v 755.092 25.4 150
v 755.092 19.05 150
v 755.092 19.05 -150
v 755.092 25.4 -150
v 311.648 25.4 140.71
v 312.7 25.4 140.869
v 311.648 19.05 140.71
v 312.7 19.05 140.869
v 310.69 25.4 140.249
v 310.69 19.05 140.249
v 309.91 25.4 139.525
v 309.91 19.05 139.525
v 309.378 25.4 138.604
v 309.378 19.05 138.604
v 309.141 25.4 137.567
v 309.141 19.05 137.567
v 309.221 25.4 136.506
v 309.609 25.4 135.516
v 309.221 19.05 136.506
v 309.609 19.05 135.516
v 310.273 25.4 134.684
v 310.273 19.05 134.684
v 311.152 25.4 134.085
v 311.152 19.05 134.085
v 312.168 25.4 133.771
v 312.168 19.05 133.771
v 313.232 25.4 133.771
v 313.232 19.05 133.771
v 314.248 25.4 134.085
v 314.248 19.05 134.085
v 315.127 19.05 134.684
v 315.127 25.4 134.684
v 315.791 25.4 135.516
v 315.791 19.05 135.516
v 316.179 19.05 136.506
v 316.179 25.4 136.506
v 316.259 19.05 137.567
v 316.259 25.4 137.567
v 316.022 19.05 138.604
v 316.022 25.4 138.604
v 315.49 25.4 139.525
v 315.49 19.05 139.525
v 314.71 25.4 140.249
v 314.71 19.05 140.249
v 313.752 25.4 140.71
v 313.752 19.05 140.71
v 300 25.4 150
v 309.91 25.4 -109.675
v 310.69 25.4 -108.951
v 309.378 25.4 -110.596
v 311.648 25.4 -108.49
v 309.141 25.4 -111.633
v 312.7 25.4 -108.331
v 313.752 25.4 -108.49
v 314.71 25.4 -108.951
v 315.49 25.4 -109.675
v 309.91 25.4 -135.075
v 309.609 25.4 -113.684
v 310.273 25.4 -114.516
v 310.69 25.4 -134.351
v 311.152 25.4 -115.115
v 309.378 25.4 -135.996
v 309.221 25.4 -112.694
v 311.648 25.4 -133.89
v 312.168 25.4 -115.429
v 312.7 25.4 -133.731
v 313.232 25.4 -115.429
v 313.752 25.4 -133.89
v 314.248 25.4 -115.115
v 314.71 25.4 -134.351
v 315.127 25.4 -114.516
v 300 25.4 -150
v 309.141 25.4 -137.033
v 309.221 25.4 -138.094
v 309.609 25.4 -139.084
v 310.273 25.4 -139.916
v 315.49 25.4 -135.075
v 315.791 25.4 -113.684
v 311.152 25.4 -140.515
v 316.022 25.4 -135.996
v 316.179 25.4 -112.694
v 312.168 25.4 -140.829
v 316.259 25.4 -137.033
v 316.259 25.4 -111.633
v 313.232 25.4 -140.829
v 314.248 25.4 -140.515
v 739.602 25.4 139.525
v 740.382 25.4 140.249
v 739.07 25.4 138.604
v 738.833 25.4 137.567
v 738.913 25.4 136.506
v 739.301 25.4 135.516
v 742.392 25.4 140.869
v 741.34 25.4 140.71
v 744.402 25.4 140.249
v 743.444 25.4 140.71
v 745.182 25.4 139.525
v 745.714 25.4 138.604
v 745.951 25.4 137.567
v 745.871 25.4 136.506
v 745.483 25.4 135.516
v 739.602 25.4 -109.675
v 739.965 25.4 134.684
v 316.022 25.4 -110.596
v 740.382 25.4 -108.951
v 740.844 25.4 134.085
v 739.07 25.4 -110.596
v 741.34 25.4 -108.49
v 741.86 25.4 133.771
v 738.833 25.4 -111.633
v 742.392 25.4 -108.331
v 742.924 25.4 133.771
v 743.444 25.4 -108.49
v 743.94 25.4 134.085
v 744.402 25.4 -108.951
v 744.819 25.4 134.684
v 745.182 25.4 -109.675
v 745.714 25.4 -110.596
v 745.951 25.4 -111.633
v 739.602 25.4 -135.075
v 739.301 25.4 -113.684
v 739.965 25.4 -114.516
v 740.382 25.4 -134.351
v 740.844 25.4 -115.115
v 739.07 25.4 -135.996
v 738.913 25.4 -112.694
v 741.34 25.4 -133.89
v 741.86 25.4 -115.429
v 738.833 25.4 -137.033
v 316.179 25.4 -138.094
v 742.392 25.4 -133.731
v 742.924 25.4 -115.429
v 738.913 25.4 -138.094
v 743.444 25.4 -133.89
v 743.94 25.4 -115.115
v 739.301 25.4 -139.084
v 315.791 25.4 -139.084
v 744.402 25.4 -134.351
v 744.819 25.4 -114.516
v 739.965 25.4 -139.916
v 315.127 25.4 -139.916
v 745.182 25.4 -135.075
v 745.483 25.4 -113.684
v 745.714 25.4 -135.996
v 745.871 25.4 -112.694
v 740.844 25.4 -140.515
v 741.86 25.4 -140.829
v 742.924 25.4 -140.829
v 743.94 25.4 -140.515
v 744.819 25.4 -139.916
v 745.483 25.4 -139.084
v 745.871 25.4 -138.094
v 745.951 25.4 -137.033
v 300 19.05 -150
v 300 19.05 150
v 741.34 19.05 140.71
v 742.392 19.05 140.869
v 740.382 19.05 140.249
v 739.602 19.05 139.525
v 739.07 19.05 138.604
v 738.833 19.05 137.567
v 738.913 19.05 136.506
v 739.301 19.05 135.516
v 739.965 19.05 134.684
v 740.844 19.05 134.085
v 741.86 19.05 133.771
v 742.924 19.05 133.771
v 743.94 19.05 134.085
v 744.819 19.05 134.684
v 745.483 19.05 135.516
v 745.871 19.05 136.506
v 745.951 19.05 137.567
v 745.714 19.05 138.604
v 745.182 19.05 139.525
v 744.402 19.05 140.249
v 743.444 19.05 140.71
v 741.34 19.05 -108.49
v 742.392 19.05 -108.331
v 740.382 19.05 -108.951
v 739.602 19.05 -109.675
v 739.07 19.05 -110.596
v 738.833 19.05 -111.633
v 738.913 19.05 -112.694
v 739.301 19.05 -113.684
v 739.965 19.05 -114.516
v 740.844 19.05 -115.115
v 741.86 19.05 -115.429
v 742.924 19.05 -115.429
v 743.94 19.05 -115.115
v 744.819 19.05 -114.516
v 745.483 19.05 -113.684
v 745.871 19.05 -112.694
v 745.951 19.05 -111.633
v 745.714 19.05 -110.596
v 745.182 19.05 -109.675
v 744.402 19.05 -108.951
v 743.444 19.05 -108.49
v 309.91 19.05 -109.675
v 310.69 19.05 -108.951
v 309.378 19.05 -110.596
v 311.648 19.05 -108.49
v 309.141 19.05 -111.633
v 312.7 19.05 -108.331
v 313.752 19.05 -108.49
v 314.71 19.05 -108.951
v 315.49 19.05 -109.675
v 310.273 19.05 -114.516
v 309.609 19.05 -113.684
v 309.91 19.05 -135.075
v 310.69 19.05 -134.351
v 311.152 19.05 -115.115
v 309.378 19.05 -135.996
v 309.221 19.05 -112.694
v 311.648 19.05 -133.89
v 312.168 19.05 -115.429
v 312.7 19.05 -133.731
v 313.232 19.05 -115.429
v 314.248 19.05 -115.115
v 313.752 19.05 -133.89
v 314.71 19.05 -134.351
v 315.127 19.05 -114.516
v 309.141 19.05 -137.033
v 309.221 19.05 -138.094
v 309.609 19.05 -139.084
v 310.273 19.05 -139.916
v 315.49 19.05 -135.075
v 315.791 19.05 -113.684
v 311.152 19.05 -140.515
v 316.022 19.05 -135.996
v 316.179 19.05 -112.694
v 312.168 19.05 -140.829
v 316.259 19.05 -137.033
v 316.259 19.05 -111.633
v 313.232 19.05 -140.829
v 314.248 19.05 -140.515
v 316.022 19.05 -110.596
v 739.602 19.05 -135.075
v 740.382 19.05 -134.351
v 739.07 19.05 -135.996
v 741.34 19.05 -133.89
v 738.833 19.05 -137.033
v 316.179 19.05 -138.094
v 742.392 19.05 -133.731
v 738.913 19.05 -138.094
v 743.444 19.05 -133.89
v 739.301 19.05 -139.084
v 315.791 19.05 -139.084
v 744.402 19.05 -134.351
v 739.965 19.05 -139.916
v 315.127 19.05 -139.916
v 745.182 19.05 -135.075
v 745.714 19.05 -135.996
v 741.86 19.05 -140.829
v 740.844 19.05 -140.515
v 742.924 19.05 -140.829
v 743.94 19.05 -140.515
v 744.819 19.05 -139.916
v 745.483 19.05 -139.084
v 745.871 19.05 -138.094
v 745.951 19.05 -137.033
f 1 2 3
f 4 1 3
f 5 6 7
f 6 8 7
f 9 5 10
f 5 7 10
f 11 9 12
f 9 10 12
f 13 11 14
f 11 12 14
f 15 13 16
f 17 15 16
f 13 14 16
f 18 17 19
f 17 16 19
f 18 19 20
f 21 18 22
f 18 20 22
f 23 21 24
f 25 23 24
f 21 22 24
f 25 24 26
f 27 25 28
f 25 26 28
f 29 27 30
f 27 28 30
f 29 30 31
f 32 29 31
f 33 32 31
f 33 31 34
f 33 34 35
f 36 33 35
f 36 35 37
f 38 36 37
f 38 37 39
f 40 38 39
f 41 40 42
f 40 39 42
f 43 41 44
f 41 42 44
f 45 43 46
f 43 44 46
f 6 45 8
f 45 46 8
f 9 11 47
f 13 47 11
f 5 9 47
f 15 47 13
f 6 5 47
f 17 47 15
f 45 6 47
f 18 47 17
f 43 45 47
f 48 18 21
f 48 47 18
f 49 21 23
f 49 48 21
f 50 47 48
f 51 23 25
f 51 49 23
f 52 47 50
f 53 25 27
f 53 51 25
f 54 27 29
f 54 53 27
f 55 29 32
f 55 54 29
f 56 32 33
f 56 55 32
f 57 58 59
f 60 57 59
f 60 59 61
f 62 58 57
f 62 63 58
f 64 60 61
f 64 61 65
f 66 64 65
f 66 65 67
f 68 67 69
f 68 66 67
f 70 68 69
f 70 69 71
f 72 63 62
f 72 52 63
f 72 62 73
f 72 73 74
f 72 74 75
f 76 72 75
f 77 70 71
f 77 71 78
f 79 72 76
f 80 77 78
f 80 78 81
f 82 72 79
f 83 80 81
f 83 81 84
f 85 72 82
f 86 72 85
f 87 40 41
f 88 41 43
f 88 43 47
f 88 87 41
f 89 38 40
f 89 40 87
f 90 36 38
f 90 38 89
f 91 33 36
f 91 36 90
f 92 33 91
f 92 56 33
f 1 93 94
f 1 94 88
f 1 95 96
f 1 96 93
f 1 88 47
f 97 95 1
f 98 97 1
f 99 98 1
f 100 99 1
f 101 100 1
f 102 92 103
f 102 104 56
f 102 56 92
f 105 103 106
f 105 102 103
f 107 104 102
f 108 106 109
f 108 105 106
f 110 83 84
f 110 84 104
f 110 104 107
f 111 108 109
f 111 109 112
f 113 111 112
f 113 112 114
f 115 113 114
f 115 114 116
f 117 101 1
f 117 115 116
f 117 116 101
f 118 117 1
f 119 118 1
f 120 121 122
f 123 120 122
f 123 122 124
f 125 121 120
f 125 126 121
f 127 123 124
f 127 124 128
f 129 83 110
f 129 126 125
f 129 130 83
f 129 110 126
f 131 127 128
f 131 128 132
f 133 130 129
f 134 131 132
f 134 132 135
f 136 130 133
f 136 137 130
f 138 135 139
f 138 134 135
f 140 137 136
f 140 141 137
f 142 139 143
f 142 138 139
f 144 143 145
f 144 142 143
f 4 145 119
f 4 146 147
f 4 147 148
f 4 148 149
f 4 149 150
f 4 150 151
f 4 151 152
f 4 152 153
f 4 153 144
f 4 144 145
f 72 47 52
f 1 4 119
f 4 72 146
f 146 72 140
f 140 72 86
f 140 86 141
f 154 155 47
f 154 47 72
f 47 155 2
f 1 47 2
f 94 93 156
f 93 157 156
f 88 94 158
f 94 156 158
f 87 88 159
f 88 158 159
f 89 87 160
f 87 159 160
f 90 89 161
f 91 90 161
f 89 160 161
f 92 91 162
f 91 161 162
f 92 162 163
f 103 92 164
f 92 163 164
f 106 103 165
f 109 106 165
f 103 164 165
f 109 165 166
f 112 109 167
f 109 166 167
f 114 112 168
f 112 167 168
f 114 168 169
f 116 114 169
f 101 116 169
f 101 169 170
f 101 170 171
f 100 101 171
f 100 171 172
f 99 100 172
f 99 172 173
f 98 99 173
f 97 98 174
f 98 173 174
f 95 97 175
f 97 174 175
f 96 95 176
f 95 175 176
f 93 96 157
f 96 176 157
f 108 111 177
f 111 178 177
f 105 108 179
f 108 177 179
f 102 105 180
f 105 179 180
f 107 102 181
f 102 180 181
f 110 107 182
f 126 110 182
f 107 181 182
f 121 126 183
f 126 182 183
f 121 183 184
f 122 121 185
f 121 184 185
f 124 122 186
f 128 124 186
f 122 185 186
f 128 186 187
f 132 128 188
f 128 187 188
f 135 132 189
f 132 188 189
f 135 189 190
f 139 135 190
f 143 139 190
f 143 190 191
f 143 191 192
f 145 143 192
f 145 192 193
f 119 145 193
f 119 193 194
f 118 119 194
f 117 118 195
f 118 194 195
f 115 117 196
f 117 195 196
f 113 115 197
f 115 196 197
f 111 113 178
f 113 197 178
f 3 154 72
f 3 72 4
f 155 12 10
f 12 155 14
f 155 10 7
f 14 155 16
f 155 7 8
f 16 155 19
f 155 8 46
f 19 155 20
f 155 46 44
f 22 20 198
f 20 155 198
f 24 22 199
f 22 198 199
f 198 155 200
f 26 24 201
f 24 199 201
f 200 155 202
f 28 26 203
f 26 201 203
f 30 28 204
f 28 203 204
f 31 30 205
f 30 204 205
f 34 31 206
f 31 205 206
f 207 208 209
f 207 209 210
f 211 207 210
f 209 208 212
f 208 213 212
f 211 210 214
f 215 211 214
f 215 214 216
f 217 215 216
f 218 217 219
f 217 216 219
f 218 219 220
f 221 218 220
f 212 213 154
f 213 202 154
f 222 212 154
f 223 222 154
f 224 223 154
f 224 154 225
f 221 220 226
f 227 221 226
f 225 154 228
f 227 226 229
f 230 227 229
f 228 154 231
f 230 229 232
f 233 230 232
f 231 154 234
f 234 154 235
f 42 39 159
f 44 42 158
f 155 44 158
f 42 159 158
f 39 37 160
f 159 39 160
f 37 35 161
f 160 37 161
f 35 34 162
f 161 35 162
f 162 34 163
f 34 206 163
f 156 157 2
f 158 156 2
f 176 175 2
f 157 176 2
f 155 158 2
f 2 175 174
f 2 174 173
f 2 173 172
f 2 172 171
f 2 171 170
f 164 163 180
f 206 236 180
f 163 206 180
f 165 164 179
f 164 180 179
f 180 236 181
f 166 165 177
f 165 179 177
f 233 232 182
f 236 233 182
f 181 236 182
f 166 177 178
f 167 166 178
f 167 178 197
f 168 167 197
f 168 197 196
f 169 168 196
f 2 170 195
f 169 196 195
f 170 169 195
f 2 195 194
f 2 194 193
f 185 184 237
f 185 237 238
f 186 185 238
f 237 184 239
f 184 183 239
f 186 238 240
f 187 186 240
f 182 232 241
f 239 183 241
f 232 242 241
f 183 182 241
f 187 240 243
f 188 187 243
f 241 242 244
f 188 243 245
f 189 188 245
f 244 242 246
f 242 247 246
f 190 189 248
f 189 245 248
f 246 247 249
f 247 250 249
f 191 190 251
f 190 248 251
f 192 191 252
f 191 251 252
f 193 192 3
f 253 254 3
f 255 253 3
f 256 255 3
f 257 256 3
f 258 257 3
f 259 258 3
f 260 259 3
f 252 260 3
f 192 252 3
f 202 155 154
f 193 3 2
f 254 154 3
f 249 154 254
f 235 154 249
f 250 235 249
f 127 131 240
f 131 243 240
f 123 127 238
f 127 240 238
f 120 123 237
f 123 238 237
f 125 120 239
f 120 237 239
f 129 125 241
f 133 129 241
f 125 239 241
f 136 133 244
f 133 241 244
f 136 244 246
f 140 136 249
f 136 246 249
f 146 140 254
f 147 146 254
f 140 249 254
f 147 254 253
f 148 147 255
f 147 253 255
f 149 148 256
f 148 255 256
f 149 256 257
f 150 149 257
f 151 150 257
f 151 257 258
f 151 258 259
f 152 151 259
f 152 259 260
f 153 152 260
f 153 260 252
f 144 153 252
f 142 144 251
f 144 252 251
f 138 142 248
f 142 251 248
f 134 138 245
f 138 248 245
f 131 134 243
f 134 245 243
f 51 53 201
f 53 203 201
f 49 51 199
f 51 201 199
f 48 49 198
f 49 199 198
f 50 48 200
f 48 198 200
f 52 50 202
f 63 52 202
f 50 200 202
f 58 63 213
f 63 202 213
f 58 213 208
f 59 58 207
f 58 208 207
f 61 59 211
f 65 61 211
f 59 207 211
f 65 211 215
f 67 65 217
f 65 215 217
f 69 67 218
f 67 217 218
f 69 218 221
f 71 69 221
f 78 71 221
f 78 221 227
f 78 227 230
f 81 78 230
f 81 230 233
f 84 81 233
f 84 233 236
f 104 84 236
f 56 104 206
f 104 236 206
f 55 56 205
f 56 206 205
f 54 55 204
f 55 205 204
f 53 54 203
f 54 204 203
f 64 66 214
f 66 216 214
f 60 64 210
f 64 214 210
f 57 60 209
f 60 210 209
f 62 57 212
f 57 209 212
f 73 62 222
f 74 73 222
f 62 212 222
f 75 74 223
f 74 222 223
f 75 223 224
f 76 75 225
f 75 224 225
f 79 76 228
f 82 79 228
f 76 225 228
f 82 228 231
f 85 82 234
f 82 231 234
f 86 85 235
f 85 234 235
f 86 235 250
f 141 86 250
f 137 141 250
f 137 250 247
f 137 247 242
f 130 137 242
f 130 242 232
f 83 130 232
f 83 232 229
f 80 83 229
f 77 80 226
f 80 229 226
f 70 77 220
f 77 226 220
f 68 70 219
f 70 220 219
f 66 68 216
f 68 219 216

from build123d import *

# Parameters (mm, degrees)
BOSS_EXTRUDE1_START              = 19.05
SKETCH2_W                        = 600
SKETCH2_H                        = 256.45
BOSS_EXTRUDE1_DEPTH              = 6.35
BOSS_EXTRUDE2_START              = 19.05
SKETCH2_4_W                      = 455.092
SKETCH2_4_H                      = 256.45
BOSS_EXTRUDE2_DEPTH              = 6.35
BOSS_EXTRUDE3_START              = 19.05
SKETCH2_5_W                      = 455.092
SKETCH2_5_H                      = 300
BOSS_EXTRUDE3_DEPTH              = 6.35
SKETCH8_W                        = 3.5687
SKETCH8_H                        = 6.35
F_1_4_CLEARANCE_HOLE2_AT_2_COUNT = 2
F_1_4_CLEARANCE_HOLE2_AT_2_PITCH = 231.05
F_1_4_CLEARANCE_HOLE2_AT_3_COUNT = 2
F_1_4_CLEARANCE_HOLE2_AT_3_PITCH = 595.822744195
F_1_4_CLEARANCE_HOLE2_AT_4_COUNT = 2
F_1_4_CLEARANCE_HOLE2_AT_4_PITCH = 619.31354135
F_1_4_CLEARANCE_HOLE2_AT_5_COUNT = 2
F_1_4_CLEARANCE_HOLE2_AT_5_PITCH = 523.8
F_1_4_CLEARANCE_HOLE2_AT_6_COUNT = 2
F_1_4_CLEARANCE_HOLE2_AT_6_PITCH = 549.2
F_1_4_CLEARANCE_HOLE2_AT_7_COUNT = 2
F_1_4_CLEARANCE_HOLE2_AT_7_PITCH = 574.6
SKETCH10_W                       = 3.5687
SKETCH10_H                       = 6.35
F_1_4_CLEARANCE_HOLE3_AT_2_COUNT = 2
F_1_4_CLEARANCE_HOLE3_AT_2_PITCH = 25.4
F_1_4_CLEARANCE_HOLE3_AT_3_COUNT = 2
F_1_4_CLEARANCE_HOLE3_AT_3_PITCH = 50.8
F_1_4_CLEARANCE_HOLE3_AT_4_COUNT = 2
F_1_4_CLEARANCE_HOLE3_AT_4_PITCH = 231.05
F_1_4_CLEARANCE_HOLE3_AT_5_COUNT = 2
F_1_4_CLEARANCE_HOLE3_AT_5_PITCH = 487.872234672
F_1_4_CLEARANCE_HOLE3_AT_6_COUNT = 2
F_1_4_CLEARANCE_HOLE3_AT_6_PITCH = 476.368698976
F_1_4_CLEARANCE_HOLE3_AT_7_COUNT = 2
F_1_4_CLEARANCE_HOLE3_AT_7_PITCH = 429.692
SKETCH12_W                       = 3.5687
SKETCH12_H                       = 6.35
F_1_4_CLEARANCE_HOLE4_AT_2_COUNT = 2
F_1_4_CLEARANCE_HOLE4_AT_2_PITCH = 25.4
F_1_4_CLEARANCE_HOLE4_AT_3_COUNT = 2
F_1_4_CLEARANCE_HOLE4_AT_3_PITCH = 249.2
F_1_4_CLEARANCE_HOLE4_AT_4_COUNT = 2
F_1_4_CLEARANCE_HOLE4_AT_4_PITCH = 496.725130091
F_1_4_CLEARANCE_HOLE4_AT_5_COUNT = 2
F_1_4_CLEARANCE_HOLE4_AT_5_PITCH = 429.692
F_1_4_CLEARANCE_HOLE4_AT_6_COUNT = 2
F_1_4_CLEARANCE_HOLE4_AT_6_PITCH = 430.442069115
SKETCH14_W                       = 2.4892
SKETCH14_H                       = 6.35
F_8_CLEARANCE_HOLE2_AT_2_COUNT   = 2
F_8_CLEARANCE_HOLE2_AT_2_PITCH   = 128.5875
SKETCH16_W                       = 2.4892
SKETCH16_H                       = 6.35
F_8_CLEARANCE_HOLE3_AT_2_COUNT   = 2
F_8_CLEARANCE_HOLE3_AT_2_PITCH   = 128.5875
SKETCH17_R                       = 3.5687
BOSS_EXTRUDE4_DEPTH              = 6.35
FILLET2_R                        = 6.35
SKETCH18_W                       = 152.4
SKETCH18_H                       = 25.4
SKETCH18_R                       = 3.5687
BOSS_EXTRUDE5_DEPTH              = 6.35
SKETCH19_W                       = 25.4
SKETCH19_H                       = 101.6
SKETCH19_R                       = 3.5687
BOSS_EXTRUDE6_DEPTH              = 6.35


with BuildPart() as part:
    # Sketch2 → Boss-Extrude1 (new body)
    with BuildSketch(Plane(origin=(0, 0, 0), x_dir=(1, 0, 0), z_dir=(0, 1, 0)).offset(BOSS_EXTRUDE1_START)):
        with Locations((0, 278.225)):
            Rectangle(SKETCH2_W, SKETCH2_H)
    extrude(amount=BOSS_EXTRUDE1_DEPTH)

    # Sketch8 → 1/4 Clearance Hole2 (revolve, cut)
    with BuildSketch(Plane(origin=(-287.3, 25.4, -393.75), x_dir=(0, 0, 1), z_dir=(1, 0, 0))):
        with Locations((1.78435, 3.175)):
            Rectangle(SKETCH8_W, SKETCH8_H)
    f_1_4_clearance_hole2 = revolve(axis=Axis((-287.3, 31.75, -393.75), (0, -1, 0)), mode=Mode.SUBTRACT)

    # 1/4 Clearance Hole2 at 2: 1/4 Clearance Hole2 ×2
    with Locations(*[(0, 0, i * F_1_4_CLEARANCE_HOLE2_AT_2_PITCH) for i in range(1, F_1_4_CLEARANCE_HOLE2_AT_2_COUNT)]):
        add(f_1_4_clearance_hole2, mode=Mode.SUBTRACT)

    # 1/4 Clearance Hole2 at 3: 1/4 Clearance Hole2 ×2
    with Locations(*[Vector(0.9217506470687957, 0, 0.3877831154501913) * (i * F_1_4_CLEARANCE_HOLE2_AT_3_PITCH) for i in range(1, F_1_4_CLEARANCE_HOLE2_AT_3_COUNT)]):
        add(f_1_4_clearance_hole2, mode=Mode.SUBTRACT)

    # 1/4 Clearance Hole2 at 4: 1/4 Clearance Hole2 ×2
    with Locations(*[Vector(0.9278014473041833, 0, 0.37307435502894426) * (i * F_1_4_CLEARANCE_HOLE2_AT_4_PITCH) for i in range(1, F_1_4_CLEARANCE_HOLE2_AT_4_COUNT)]):
        add(f_1_4_clearance_hole2, mode=Mode.SUBTRACT)

    # 1/4 Clearance Hole2 at 5: 1/4 Clearance Hole2 ×2
    with Locations(*[(i * F_1_4_CLEARANCE_HOLE2_AT_5_PITCH, 0, 0) for i in range(1, F_1_4_CLEARANCE_HOLE2_AT_5_COUNT)]):
        add(f_1_4_clearance_hole2, mode=Mode.SUBTRACT)

    # 1/4 Clearance Hole2 at 6: 1/4 Clearance Hole2 ×2
    with Locations(*[(i * F_1_4_CLEARANCE_HOLE2_AT_6_PITCH, 0, 0) for i in range(1, F_1_4_CLEARANCE_HOLE2_AT_6_COUNT)]):
        add(f_1_4_clearance_hole2, mode=Mode.SUBTRACT)

    # 1/4 Clearance Hole2 at 7: 1/4 Clearance Hole2 ×2
    with Locations(*[(i * F_1_4_CLEARANCE_HOLE2_AT_7_PITCH, 0, 0) for i in range(1, F_1_4_CLEARANCE_HOLE2_AT_7_COUNT)]):
        add(f_1_4_clearance_hole2, mode=Mode.SUBTRACT)

    # Sketch14 → #8 Clearance Hole2 (revolve, cut)
    with BuildSketch(Plane(origin=(-268.25, 25.4, -351.68125), x_dir=(0, 0, 1), z_dir=(1, 0, 0))):
        with Locations((1.2446, 3.175)):
            Rectangle(SKETCH14_W, SKETCH14_H)
    f_8_clearance_hole2 = revolve(axis=Axis((-268.25, 31.75, -351.68125), (0, -1, 0)), mode=Mode.SUBTRACT)

    # #8 Clearance Hole2 at 2: #8 Clearance Hole2 ×2
    with Locations(*[(0, 0, i * F_8_CLEARANCE_HOLE2_AT_2_PITCH) for i in range(1, F_8_CLEARANCE_HOLE2_AT_2_COUNT)]):
        add(f_8_clearance_hole2, mode=Mode.SUBTRACT)


with BuildPart() as body_2:
    # Sketch2<4> → Boss-Extrude2 (new body)
    with BuildSketch(Plane(origin=(0, 0, 0), x_dir=(1, 0, 0), z_dir=(0, 1, 0)).offset(BOSS_EXTRUDE2_START)):
        with Locations((527.546, 278.225)):
            Rectangle(SKETCH2_4_W, SKETCH2_4_H)
    extrude(amount=BOSS_EXTRUDE2_DEPTH)

    # Sketch10 → 1/4 Clearance Hole3 (revolve, cut)
    with BuildSketch(Plane(origin=(312.7, 25.4, -393.75), x_dir=(0, 0, 1), z_dir=(1, 0, 0))):
        with Locations((1.78435, 3.175)):
            Rectangle(SKETCH10_W, SKETCH10_H)
    f_1_4_clearance_hole3 = revolve(axis=Axis((312.7, 31.75, -393.75), (0, -1, 0)), mode=Mode.SUBTRACT)

    # 1/4 Clearance Hole3 at 2: 1/4 Clearance Hole3 ×2
    with Locations(*[(i * F_1_4_CLEARANCE_HOLE3_AT_2_PITCH, 0, 0) for i in range(1, F_1_4_CLEARANCE_HOLE3_AT_2_COUNT)]):
        add(f_1_4_clearance_hole3, mode=Mode.SUBTRACT)

    # 1/4 Clearance Hole3 at 3: 1/4 Clearance Hole3 ×2
    with Locations(*[(i * F_1_4_CLEARANCE_HOLE3_AT_3_PITCH, 0, 0) for i in range(1, F_1_4_CLEARANCE_HOLE3_AT_3_COUNT)]):
        add(f_1_4_clearance_hole3, mode=Mode.SUBTRACT)

    # 1/4 Clearance Hole3 at 4: 1/4 Clearance Hole3 ×2
    with Locations(*[(0, 0, i * F_1_4_CLEARANCE_HOLE3_AT_4_PITCH) for i in range(1, F_1_4_CLEARANCE_HOLE3_AT_4_COUNT)]):
        add(f_1_4_clearance_hole3, mode=Mode.SUBTRACT)

    # 1/4 Clearance Hole3 at 5: 1/4 Clearance Hole3 ×2
    with Locations(*[Vector(0.880746985506873, 0, 0.47358710658183684) * (i * F_1_4_CLEARANCE_HOLE3_AT_5_PITCH) for i in range(1, F_1_4_CLEARANCE_HOLE3_AT_5_COUNT)]):
        add(f_1_4_clearance_hole3, mode=Mode.SUBTRACT)

    # 1/4 Clearance Hole3 at 6: 1/4 Clearance Hole3 ×2
    with Locations(*[Vector(0.9020156045595491, 0, 0.4317034272866863) * (i * F_1_4_CLEARANCE_HOLE3_AT_6_PITCH) for i in range(1, F_1_4_CLEARANCE_HOLE3_AT_6_COUNT)]):
        add(f_1_4_clearance_hole3, mode=Mode.SUBTRACT)

    # 1/4 Clearance Hole3 at 7: 1/4 Clearance Hole3 ×2
    with Locations(*[(i * F_1_4_CLEARANCE_HOLE3_AT_7_PITCH, 0, 0) for i in range(1, F_1_4_CLEARANCE_HOLE3_AT_7_COUNT)]):
        add(f_1_4_clearance_hole3, mode=Mode.SUBTRACT)

    # Sketch16 → #8 Clearance Hole3 (revolve, cut)
    with BuildSketch(Plane(origin=(723.342, 25.4, -351.68125), x_dir=(0, 0, 1), z_dir=(1, 0, 0))):
        with Locations((1.2446, 3.175)):
            Rectangle(SKETCH16_W, SKETCH16_H)
    f_8_clearance_hole3 = revolve(axis=Axis((723.342, 31.75, -351.68125), (0, -1, 0)), mode=Mode.SUBTRACT)

    # #8 Clearance Hole3 at 2: #8 Clearance Hole3 ×2
    with Locations(*[(0, 0, i * F_8_CLEARANCE_HOLE3_AT_2_PITCH) for i in range(1, F_8_CLEARANCE_HOLE3_AT_2_COUNT)]):
        add(f_8_clearance_hole3, mode=Mode.SUBTRACT)


with BuildPart() as body_3:
    # Sketch2<5> → Boss-Extrude3 (new body)
    with BuildSketch(Plane(origin=(0, 0, 0), x_dir=(1, 0, 0), z_dir=(0, 1, 0)).offset(BOSS_EXTRUDE3_START)):
        with Locations((527.546, 0)):
            Rectangle(SKETCH2_5_W, SKETCH2_5_H)
    extrude(amount=BOSS_EXTRUDE3_DEPTH)

    # Sketch12 → 1/4 Clearance Hole4 (revolve, cut)
    with BuildSketch(Plane(origin=(312.7, 25.4, -111.9), x_dir=(0, 0, 1), z_dir=(1, 0, 0))):
        with Locations((1.78435, 3.175)):
            Rectangle(SKETCH12_W, SKETCH12_H)
    f_1_4_clearance_hole4 = revolve(axis=Axis((312.7, 31.75, -111.9), (0, -1, 0)), mode=Mode.SUBTRACT)

    # 1/4 Clearance Hole4 at 2: 1/4 Clearance Hole4 ×2
    with Locations(*[(0, 0, -i * F_1_4_CLEARANCE_HOLE4_AT_2_PITCH) for i in range(1, F_1_4_CLEARANCE_HOLE4_AT_2_COUNT)]):
        add(f_1_4_clearance_hole4, mode=Mode.SUBTRACT)

    # 1/4 Clearance Hole4 at 3: 1/4 Clearance Hole4 ×2
    with Locations(*[(0, 0, i * F_1_4_CLEARANCE_HOLE4_AT_3_PITCH) for i in range(1, F_1_4_CLEARANCE_HOLE4_AT_3_COUNT)]):
        add(f_1_4_clearance_hole4, mode=Mode.SUBTRACT)

    # 1/4 Clearance Hole4 at 4: 1/4 Clearance Hole4 ×2
    with Locations(*[Vector(0.865049851456502, 0, 0.5016859121951541) * (i * F_1_4_CLEARANCE_HOLE4_AT_4_PITCH) for i in range(1, F_1_4_CLEARANCE_HOLE4_AT_4_COUNT)]):
        add(f_1_4_clearance_hole4, mode=Mode.SUBTRACT)

    # 1/4 Clearance Hole4 at 5: 1/4 Clearance Hole4 ×2
    with Locations(*[(i * F_1_4_CLEARANCE_HOLE4_AT_5_PITCH, 0, 0) for i in range(1, F_1_4_CLEARANCE_HOLE4_AT_5_COUNT)]):
        add(f_1_4_clearance_hole4, mode=Mode.SUBTRACT)

    # 1/4 Clearance Hole4 at 6: 1/4 Clearance Hole4 ×2
    with Locations(*[Vector(0.998257444685787, 0, -0.05900910208944768) * (i * F_1_4_CLEARANCE_HOLE4_AT_6_PITCH) for i in range(1, F_1_4_CLEARANCE_HOLE4_AT_6_COUNT)]):
        add(f_1_4_clearance_hole4, mode=Mode.SUBTRACT)


with BuildPart() as body_4:
    # Sketch17 → Boss-Extrude4 (new body)
    with BuildSketch(Plane(origin=(0, 25.4, 0), x_dir=(1, 0, 0), z_dir=(0, 1, 0))):
        Polygon((249.2, 150), (249.2, 175.4), (325.4, 175.4), (325.4, 99.2), (300, 99.2), (300, 150), align=None)
        with Locations(Location((261.9, 162.7, 0), (0, 0, 270))):
            Circle(SKETCH17_R, mode=Mode.SUBTRACT)
        with Locations(Location((287.3, 162.7, 0), (0, 0, 270))):
            Circle(SKETCH17_R, mode=Mode.SUBTRACT)
        with Locations(Location((312.7, 162.7, 0), (0, 0, 270))):
            Circle(SKETCH17_R, mode=Mode.SUBTRACT)
        with Locations(Location((312.7, 137.3, 0), (0, 0, 270))):
            Circle(SKETCH17_R, mode=Mode.SUBTRACT)
        with Locations(Location((312.7, 111.9, 0), (0, 0, 270))):
            Circle(SKETCH17_R, mode=Mode.SUBTRACT)
    extrude(amount=BOSS_EXTRUDE4_DEPTH)

    # Fillet2
    fillet2_edges = [body_4.edges().sort_by_distance(p)[0] for p in [
        (249.2, 28.575, -150),
        (249.2, 28.575, -175.4),
        (325.4, 28.575, -175.4),
        (325.4, 28.575, -99.2),
        (300, 28.575, -99.2),
    ]]
    fillet(fillet2_edges, radius=FILLET2_R)


with BuildPart() as body_5:
    # Sketch18 → Boss-Extrude5 (new body)
    with BuildSketch(Plane(origin=(0, 25.4, 0), x_dir=(1, 0, 0), z_dir=(0, 1, 0))):
        with Locations((300, 393.75)):
            Rectangle(SKETCH18_W, SKETCH18_H)
        with Locations(Location((236.5, 393.75, 0), (0, 0, 270))):
            Circle(SKETCH18_R, mode=Mode.SUBTRACT)
        with Locations(Location((261.9, 393.75, 0), (0, 0, 270))):
            Circle(SKETCH18_R, mode=Mode.SUBTRACT)
        with Locations(Location((287.3, 393.75, 0), (0, 0, 270))):
            Circle(SKETCH18_R, mode=Mode.SUBTRACT)
        with Locations(Location((312.7, 393.75, 0), (0, 0, 270))):
            Circle(SKETCH18_R, mode=Mode.SUBTRACT)
        with Locations(Location((338.1, 393.75, 0), (0, 0, 270))):
            Circle(SKETCH18_R, mode=Mode.SUBTRACT)
        with Locations(Location((363.5, 393.75, 0), (0, 0, 270))):
            Circle(SKETCH18_R, mode=Mode.SUBTRACT)
    extrude(amount=BOSS_EXTRUDE5_DEPTH)


with BuildPart() as body_6:
    # Sketch19 → Boss-Extrude6 (new body)
    with BuildSketch(Plane(origin=(0, 25.4, 0), x_dir=(1, 0, 0), z_dir=(0, 1, 0))):
        with Locations((742.392, 150)):
            Rectangle(SKETCH19_W, SKETCH19_H)
        with Locations(Location((742.392, 111.9, 0), (0, 0, 270))):
            Circle(SKETCH19_R, mode=Mode.SUBTRACT)
        with Locations(Location((742.392, 137.3, 0), (0, 0, 270))):
            Circle(SKETCH19_R, mode=Mode.SUBTRACT)
        with Locations((742.392, 162.7)):
            Circle(SKETCH19_R, mode=Mode.SUBTRACT)
        with Locations((742.392, 188.1)):
            Circle(SKETCH19_R, mode=Mode.SUBTRACT)
    extrude(amount=BOSS_EXTRUDE6_DEPTH)


solid = body_3.part
